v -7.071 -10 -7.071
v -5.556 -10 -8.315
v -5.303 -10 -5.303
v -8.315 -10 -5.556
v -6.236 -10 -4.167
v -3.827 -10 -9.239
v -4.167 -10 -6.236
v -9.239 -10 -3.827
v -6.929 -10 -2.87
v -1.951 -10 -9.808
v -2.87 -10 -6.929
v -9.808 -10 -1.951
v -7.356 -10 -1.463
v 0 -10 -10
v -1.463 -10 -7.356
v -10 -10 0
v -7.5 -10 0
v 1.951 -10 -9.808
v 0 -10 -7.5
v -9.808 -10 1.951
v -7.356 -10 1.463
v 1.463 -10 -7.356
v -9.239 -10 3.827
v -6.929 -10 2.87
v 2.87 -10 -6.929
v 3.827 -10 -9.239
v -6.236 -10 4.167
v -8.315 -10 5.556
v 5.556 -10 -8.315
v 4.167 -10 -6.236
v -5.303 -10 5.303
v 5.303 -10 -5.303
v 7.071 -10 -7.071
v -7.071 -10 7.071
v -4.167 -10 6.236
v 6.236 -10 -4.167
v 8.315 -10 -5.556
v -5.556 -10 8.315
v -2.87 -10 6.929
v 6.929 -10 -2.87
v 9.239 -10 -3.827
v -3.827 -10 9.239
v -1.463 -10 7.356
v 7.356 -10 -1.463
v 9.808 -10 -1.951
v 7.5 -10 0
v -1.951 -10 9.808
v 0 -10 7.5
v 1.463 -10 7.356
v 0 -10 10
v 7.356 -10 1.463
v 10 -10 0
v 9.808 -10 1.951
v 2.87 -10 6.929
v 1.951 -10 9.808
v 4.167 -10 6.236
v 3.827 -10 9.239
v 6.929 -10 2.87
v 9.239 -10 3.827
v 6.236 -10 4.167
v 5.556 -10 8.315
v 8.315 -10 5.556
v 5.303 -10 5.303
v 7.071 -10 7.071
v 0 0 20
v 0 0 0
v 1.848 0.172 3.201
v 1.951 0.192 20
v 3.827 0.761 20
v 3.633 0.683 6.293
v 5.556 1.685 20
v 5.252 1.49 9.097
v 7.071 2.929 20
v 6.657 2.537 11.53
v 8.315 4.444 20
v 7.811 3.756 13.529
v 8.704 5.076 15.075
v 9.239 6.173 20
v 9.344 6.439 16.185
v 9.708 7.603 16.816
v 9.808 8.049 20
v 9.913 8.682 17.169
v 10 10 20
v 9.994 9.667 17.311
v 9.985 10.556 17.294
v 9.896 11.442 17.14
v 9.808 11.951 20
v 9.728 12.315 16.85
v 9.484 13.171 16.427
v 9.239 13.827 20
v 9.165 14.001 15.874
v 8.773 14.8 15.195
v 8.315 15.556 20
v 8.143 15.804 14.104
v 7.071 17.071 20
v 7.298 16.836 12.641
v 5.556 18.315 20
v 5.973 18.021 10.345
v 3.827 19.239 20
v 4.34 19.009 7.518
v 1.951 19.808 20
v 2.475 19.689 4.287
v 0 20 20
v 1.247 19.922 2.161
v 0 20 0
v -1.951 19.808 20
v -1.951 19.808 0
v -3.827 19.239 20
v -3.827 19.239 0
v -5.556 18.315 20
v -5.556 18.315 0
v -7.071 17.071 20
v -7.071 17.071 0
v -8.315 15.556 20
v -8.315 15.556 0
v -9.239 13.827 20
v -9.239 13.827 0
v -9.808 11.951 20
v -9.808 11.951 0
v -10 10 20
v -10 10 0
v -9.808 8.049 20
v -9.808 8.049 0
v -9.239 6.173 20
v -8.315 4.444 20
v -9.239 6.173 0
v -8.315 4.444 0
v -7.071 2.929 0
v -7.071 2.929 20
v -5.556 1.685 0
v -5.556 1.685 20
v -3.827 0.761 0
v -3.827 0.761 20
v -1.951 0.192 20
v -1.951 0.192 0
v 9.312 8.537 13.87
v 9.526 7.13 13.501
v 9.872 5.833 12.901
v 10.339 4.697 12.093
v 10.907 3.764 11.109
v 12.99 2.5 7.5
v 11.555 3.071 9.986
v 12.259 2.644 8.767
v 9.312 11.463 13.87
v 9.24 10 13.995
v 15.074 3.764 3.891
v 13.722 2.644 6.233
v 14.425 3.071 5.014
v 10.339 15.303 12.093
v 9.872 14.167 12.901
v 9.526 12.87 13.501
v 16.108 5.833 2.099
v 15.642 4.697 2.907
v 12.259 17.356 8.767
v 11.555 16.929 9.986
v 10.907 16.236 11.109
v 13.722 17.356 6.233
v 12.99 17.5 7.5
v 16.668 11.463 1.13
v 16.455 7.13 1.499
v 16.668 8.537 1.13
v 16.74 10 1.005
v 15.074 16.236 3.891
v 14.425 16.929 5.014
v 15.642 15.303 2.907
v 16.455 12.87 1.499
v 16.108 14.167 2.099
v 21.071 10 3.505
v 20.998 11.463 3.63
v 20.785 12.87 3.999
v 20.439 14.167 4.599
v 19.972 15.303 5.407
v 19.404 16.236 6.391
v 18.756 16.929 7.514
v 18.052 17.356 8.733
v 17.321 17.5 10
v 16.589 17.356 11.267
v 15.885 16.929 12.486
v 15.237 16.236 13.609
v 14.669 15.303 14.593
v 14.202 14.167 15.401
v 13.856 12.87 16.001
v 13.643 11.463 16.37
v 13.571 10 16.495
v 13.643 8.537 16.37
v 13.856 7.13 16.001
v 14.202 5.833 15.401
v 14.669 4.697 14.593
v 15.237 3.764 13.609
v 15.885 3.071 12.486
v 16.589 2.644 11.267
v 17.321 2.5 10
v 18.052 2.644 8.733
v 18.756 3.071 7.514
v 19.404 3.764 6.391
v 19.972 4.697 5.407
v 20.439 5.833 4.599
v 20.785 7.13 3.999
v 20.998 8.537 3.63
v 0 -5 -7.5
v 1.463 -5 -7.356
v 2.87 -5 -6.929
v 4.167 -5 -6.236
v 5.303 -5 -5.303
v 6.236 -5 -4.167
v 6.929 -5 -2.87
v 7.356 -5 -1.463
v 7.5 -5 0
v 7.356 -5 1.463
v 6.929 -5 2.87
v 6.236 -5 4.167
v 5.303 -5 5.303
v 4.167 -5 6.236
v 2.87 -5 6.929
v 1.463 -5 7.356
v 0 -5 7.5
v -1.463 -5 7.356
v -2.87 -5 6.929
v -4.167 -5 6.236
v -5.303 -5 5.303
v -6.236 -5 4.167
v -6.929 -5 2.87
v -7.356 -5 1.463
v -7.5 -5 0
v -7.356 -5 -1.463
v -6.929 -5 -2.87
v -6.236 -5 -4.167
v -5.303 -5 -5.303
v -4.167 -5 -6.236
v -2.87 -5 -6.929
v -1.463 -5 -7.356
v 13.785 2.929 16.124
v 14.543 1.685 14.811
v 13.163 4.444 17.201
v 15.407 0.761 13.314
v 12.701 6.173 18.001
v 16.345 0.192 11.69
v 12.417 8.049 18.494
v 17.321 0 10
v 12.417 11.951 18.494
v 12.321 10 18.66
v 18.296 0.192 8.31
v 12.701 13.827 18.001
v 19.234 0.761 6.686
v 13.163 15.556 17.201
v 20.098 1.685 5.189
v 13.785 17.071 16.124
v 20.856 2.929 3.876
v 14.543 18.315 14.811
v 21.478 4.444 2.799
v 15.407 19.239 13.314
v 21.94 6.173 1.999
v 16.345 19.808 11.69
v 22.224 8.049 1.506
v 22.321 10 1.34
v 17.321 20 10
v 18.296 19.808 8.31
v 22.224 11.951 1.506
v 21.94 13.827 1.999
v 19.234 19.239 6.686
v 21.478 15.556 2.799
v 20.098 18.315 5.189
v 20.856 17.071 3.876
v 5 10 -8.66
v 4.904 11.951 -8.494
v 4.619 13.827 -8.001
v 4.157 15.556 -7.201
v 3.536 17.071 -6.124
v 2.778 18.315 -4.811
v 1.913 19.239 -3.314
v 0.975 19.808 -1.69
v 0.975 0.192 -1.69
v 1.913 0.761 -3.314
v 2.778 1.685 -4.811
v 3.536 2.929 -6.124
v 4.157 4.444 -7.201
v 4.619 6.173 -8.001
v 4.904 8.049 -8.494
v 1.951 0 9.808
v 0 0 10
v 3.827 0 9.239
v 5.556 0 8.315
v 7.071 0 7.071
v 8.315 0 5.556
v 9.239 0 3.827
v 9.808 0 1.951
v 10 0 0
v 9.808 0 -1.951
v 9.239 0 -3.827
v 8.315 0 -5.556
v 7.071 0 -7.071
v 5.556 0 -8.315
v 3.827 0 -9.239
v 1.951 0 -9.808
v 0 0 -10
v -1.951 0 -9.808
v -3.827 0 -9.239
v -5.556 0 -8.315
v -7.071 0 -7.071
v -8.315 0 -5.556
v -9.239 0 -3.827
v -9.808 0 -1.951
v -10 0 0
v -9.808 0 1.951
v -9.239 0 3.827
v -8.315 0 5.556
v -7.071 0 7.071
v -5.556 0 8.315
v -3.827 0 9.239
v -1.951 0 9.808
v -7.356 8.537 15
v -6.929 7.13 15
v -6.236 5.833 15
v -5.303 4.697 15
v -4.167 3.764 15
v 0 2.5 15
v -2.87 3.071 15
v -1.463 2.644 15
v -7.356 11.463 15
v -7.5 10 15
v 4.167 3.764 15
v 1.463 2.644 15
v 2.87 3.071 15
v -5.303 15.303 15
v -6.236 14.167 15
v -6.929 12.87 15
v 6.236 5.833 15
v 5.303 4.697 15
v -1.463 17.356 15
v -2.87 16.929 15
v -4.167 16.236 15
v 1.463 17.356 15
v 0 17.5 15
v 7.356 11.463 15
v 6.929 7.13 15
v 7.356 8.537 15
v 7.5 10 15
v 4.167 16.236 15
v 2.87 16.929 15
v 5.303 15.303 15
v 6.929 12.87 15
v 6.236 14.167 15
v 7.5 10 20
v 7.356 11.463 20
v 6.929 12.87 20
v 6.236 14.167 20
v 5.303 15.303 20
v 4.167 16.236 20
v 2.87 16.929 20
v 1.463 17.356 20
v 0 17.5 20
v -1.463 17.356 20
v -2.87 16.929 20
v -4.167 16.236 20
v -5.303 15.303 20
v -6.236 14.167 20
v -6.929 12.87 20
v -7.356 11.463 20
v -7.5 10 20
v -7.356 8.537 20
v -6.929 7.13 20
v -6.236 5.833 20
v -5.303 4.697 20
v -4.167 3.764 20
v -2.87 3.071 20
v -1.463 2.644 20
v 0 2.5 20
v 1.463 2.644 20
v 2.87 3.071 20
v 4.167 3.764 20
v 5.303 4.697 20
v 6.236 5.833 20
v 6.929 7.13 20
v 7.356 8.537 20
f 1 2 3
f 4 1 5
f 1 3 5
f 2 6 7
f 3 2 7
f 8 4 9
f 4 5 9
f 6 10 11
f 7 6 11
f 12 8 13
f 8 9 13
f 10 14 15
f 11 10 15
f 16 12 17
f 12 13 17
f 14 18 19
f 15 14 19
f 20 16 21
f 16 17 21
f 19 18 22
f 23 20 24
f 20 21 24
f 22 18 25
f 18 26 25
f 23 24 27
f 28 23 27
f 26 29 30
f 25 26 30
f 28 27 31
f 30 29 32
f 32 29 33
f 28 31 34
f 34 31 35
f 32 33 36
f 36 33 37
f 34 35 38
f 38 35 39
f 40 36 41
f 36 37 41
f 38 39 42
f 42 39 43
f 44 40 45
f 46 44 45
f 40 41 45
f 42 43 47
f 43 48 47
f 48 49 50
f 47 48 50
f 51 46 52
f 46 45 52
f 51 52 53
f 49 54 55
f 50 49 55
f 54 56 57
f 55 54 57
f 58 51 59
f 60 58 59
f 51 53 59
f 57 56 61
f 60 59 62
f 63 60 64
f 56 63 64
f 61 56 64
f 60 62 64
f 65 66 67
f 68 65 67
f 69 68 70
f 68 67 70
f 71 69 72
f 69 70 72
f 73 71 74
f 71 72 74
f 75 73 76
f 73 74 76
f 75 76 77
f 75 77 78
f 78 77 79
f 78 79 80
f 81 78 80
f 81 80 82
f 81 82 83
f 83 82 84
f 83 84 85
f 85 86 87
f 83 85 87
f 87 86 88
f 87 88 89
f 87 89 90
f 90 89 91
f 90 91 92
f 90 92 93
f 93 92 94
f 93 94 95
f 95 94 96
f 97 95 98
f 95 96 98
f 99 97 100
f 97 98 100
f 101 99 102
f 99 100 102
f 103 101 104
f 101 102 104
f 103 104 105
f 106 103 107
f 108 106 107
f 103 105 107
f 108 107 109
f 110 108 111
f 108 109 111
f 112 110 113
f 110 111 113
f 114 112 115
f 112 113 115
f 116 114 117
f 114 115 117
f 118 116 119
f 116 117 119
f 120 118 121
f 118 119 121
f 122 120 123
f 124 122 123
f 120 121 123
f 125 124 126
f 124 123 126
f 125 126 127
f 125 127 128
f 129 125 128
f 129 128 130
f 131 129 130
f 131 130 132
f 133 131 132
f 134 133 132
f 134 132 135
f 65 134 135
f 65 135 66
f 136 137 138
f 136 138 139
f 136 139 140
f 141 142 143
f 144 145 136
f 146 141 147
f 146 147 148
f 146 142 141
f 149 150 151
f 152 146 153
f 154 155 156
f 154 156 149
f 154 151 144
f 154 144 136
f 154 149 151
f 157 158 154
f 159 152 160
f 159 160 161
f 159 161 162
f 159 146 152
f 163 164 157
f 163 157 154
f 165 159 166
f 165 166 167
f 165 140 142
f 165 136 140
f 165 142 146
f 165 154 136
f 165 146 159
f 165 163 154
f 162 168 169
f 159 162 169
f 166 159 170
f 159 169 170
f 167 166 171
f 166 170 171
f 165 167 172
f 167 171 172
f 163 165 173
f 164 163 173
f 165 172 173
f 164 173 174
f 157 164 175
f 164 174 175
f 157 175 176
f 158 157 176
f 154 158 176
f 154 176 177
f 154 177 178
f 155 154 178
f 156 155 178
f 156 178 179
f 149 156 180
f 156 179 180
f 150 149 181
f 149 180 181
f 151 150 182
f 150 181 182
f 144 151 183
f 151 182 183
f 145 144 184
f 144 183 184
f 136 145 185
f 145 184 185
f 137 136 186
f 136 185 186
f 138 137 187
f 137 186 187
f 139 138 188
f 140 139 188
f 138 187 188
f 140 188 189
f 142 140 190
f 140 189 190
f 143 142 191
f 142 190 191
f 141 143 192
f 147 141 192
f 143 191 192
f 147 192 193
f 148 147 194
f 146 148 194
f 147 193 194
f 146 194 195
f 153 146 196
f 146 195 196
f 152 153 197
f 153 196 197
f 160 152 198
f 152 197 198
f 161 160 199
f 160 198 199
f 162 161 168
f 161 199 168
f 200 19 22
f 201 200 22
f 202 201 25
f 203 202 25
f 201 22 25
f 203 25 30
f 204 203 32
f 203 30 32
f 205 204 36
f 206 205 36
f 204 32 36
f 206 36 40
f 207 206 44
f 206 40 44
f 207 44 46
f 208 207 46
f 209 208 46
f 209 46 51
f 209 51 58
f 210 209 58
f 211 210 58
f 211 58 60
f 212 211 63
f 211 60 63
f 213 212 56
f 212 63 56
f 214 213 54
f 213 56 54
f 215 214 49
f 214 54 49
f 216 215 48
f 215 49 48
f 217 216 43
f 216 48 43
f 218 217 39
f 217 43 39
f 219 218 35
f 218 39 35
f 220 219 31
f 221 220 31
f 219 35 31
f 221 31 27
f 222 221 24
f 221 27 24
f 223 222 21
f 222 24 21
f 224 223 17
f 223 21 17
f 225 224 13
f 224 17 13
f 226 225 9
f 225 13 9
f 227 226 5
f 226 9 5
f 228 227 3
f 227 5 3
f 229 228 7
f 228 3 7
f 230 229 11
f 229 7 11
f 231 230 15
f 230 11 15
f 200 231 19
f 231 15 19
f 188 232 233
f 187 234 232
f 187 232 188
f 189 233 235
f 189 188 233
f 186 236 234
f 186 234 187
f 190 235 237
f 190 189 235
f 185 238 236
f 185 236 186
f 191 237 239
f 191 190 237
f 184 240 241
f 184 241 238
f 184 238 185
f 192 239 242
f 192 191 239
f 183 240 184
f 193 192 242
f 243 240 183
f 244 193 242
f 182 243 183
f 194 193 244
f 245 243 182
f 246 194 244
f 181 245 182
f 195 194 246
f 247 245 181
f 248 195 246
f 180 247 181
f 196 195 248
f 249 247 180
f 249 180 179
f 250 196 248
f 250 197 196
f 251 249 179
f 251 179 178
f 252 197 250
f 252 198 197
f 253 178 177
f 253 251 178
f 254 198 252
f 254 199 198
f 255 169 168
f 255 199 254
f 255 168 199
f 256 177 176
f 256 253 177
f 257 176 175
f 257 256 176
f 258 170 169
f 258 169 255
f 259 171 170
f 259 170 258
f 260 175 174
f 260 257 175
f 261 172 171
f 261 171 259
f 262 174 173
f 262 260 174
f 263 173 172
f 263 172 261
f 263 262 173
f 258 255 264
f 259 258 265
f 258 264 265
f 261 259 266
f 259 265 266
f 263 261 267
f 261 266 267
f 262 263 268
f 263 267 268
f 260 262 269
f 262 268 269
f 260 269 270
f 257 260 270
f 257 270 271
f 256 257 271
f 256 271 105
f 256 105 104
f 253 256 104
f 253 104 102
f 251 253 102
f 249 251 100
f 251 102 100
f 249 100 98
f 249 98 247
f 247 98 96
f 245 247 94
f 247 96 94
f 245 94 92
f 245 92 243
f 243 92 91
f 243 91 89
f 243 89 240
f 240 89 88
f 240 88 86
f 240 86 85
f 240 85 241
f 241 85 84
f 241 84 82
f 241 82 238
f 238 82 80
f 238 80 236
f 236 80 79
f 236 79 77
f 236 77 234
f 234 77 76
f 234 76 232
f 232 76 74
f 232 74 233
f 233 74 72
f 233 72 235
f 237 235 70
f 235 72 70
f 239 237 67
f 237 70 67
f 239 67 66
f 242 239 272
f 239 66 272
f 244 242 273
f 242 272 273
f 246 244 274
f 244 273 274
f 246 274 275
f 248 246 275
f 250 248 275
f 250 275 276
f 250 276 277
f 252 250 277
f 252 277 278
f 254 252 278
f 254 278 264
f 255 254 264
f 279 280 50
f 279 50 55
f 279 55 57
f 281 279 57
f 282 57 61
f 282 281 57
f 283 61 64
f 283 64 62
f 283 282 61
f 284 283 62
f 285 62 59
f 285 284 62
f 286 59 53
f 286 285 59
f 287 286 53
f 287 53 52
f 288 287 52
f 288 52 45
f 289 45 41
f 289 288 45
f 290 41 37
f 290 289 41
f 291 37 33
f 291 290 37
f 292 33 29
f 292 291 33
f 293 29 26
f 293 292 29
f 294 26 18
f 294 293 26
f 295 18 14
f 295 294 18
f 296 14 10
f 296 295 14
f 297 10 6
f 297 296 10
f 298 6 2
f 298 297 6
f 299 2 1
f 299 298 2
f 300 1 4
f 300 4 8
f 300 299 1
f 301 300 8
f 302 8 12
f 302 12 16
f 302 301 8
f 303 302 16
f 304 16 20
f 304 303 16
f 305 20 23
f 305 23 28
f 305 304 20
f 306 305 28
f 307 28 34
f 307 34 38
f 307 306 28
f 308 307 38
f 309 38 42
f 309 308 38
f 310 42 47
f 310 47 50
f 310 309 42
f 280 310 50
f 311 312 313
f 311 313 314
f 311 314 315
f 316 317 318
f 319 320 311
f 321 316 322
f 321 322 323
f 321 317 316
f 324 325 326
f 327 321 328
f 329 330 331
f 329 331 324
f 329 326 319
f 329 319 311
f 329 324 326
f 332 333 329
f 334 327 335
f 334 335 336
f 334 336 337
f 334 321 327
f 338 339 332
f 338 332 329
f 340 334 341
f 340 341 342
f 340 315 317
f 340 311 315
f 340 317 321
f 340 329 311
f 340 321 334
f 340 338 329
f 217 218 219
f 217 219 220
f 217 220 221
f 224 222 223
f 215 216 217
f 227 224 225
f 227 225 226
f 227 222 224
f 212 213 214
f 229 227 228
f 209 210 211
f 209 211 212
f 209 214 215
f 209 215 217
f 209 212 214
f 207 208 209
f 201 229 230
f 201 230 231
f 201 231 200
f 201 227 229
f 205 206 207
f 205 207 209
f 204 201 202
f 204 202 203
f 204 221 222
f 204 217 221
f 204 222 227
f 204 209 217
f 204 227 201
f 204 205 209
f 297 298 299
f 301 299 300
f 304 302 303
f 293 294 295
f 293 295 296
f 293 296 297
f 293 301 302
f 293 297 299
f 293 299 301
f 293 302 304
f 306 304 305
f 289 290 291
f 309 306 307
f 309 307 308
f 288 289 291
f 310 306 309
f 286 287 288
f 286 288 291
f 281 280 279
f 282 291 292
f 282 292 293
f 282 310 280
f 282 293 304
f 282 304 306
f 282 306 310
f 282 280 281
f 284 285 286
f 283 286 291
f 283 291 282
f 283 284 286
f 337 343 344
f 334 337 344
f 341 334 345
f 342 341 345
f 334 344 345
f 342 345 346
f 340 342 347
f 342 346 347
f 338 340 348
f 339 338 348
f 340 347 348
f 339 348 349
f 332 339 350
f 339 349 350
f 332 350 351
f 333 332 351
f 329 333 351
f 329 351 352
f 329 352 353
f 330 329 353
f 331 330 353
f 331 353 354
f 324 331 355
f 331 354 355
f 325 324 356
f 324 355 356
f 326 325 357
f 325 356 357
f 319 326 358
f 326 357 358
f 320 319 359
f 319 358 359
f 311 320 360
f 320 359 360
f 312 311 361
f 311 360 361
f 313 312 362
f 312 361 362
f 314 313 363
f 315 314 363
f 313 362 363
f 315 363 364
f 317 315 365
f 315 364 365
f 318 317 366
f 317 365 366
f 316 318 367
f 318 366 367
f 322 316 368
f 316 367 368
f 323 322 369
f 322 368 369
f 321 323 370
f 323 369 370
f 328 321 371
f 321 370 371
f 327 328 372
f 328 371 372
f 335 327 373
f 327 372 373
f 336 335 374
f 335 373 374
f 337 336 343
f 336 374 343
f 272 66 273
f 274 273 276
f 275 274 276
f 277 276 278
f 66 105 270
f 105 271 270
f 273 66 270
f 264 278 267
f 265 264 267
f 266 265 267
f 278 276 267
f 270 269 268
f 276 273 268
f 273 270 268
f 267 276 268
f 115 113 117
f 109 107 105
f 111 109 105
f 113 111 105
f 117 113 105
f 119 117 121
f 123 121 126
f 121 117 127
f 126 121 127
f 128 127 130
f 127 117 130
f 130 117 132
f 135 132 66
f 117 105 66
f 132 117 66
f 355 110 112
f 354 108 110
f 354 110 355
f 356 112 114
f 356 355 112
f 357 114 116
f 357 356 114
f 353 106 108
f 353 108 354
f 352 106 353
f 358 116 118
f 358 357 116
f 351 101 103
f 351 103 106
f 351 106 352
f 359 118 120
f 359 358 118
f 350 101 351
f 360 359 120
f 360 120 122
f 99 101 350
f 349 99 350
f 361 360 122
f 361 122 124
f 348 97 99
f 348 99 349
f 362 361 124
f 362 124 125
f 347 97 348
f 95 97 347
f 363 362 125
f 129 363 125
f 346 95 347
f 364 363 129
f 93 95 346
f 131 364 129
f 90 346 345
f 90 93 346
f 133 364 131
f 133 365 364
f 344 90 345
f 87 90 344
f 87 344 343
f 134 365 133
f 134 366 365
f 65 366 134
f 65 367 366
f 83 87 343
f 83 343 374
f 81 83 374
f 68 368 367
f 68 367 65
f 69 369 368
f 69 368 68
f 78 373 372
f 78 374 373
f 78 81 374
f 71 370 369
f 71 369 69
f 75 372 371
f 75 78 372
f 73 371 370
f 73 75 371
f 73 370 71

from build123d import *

# Parameters (mm, degrees)
SKETCH1_R           = 10
BOSS_EXTRUDE1_DEPTH = 10
SKETCH2_R           = 7.5
CUT_EXTRUDE1_DEPTH  = 5
SKETCH7_R           = 10
BOSS_EXTRUDE2_DEPTH = 20
SKETCH9_R           = 10
BOSS_EXTRUDE3_DEPTH = 20
SKETCH10_R          = 7.5
CUT_EXTRUDE2_DEPTH  = 5
SKETCH11_R          = 7.5
CUT_EXTRUDE3_DEPTH  = 5


with BuildPart() as part:
    # Sketch1 → Boss-Extrude1 (new body)
    with BuildSketch(Plane(origin=(0, 0, 0), x_dir=(1, 0, 0), z_dir=(0, 1, 0))):
        Circle(SKETCH1_R)
    extrude(amount=-BOSS_EXTRUDE1_DEPTH)

    # Sketch2 → Cut-Extrude1 (cut)
    with BuildSketch(Plane.XZ.offset(10)):
        Circle(SKETCH2_R)
    extrude(amount=-CUT_EXTRUDE1_DEPTH, mode=Mode.SUBTRACT)


with BuildPart() as body_2:
    # Sketch7 → Boss-Extrude2 (new body)
    with BuildSketch(Plane(origin=(0, 0, 0), x_dir=(0, -1, 0), z_dir=(0.866025403784438, 0, 0.500000000000001))):
        with Locations((-10, 0)):
            Circle(SKETCH7_R)
    extrude(amount=BOSS_EXTRUDE2_DEPTH)

    # Sketch9 → Boss-Extrude3 (add)
    with BuildSketch(Plane.XY):
        with Locations((0, 10)):
            Circle(SKETCH9_R)
    extrude(amount=BOSS_EXTRUDE3_DEPTH)

    # Sketch10 → Cut-Extrude2 (cut)
    with BuildSketch(Plane.XY.offset(20)):
        with Locations((0, 10)):
            Circle(SKETCH10_R)
    extrude(amount=-CUT_EXTRUDE2_DEPTH, mode=Mode.SUBTRACT)

    # Sketch11 → Cut-Extrude3 (cut)
    with BuildSketch(Plane(origin=(17.320508076, 0, 10), x_dir=(0.500000000000001, 0, -0.8660254037844382), z_dir=(0.8660254037844382, 0, 0.500000000000001))):
        with Locations((0, 10)):
            Circle(SKETCH11_R)
    extrude(amount=-CUT_EXTRUDE3_DEPTH, mode=Mode.SUBTRACT)


solid = Compound([part.part, body_2.part])
